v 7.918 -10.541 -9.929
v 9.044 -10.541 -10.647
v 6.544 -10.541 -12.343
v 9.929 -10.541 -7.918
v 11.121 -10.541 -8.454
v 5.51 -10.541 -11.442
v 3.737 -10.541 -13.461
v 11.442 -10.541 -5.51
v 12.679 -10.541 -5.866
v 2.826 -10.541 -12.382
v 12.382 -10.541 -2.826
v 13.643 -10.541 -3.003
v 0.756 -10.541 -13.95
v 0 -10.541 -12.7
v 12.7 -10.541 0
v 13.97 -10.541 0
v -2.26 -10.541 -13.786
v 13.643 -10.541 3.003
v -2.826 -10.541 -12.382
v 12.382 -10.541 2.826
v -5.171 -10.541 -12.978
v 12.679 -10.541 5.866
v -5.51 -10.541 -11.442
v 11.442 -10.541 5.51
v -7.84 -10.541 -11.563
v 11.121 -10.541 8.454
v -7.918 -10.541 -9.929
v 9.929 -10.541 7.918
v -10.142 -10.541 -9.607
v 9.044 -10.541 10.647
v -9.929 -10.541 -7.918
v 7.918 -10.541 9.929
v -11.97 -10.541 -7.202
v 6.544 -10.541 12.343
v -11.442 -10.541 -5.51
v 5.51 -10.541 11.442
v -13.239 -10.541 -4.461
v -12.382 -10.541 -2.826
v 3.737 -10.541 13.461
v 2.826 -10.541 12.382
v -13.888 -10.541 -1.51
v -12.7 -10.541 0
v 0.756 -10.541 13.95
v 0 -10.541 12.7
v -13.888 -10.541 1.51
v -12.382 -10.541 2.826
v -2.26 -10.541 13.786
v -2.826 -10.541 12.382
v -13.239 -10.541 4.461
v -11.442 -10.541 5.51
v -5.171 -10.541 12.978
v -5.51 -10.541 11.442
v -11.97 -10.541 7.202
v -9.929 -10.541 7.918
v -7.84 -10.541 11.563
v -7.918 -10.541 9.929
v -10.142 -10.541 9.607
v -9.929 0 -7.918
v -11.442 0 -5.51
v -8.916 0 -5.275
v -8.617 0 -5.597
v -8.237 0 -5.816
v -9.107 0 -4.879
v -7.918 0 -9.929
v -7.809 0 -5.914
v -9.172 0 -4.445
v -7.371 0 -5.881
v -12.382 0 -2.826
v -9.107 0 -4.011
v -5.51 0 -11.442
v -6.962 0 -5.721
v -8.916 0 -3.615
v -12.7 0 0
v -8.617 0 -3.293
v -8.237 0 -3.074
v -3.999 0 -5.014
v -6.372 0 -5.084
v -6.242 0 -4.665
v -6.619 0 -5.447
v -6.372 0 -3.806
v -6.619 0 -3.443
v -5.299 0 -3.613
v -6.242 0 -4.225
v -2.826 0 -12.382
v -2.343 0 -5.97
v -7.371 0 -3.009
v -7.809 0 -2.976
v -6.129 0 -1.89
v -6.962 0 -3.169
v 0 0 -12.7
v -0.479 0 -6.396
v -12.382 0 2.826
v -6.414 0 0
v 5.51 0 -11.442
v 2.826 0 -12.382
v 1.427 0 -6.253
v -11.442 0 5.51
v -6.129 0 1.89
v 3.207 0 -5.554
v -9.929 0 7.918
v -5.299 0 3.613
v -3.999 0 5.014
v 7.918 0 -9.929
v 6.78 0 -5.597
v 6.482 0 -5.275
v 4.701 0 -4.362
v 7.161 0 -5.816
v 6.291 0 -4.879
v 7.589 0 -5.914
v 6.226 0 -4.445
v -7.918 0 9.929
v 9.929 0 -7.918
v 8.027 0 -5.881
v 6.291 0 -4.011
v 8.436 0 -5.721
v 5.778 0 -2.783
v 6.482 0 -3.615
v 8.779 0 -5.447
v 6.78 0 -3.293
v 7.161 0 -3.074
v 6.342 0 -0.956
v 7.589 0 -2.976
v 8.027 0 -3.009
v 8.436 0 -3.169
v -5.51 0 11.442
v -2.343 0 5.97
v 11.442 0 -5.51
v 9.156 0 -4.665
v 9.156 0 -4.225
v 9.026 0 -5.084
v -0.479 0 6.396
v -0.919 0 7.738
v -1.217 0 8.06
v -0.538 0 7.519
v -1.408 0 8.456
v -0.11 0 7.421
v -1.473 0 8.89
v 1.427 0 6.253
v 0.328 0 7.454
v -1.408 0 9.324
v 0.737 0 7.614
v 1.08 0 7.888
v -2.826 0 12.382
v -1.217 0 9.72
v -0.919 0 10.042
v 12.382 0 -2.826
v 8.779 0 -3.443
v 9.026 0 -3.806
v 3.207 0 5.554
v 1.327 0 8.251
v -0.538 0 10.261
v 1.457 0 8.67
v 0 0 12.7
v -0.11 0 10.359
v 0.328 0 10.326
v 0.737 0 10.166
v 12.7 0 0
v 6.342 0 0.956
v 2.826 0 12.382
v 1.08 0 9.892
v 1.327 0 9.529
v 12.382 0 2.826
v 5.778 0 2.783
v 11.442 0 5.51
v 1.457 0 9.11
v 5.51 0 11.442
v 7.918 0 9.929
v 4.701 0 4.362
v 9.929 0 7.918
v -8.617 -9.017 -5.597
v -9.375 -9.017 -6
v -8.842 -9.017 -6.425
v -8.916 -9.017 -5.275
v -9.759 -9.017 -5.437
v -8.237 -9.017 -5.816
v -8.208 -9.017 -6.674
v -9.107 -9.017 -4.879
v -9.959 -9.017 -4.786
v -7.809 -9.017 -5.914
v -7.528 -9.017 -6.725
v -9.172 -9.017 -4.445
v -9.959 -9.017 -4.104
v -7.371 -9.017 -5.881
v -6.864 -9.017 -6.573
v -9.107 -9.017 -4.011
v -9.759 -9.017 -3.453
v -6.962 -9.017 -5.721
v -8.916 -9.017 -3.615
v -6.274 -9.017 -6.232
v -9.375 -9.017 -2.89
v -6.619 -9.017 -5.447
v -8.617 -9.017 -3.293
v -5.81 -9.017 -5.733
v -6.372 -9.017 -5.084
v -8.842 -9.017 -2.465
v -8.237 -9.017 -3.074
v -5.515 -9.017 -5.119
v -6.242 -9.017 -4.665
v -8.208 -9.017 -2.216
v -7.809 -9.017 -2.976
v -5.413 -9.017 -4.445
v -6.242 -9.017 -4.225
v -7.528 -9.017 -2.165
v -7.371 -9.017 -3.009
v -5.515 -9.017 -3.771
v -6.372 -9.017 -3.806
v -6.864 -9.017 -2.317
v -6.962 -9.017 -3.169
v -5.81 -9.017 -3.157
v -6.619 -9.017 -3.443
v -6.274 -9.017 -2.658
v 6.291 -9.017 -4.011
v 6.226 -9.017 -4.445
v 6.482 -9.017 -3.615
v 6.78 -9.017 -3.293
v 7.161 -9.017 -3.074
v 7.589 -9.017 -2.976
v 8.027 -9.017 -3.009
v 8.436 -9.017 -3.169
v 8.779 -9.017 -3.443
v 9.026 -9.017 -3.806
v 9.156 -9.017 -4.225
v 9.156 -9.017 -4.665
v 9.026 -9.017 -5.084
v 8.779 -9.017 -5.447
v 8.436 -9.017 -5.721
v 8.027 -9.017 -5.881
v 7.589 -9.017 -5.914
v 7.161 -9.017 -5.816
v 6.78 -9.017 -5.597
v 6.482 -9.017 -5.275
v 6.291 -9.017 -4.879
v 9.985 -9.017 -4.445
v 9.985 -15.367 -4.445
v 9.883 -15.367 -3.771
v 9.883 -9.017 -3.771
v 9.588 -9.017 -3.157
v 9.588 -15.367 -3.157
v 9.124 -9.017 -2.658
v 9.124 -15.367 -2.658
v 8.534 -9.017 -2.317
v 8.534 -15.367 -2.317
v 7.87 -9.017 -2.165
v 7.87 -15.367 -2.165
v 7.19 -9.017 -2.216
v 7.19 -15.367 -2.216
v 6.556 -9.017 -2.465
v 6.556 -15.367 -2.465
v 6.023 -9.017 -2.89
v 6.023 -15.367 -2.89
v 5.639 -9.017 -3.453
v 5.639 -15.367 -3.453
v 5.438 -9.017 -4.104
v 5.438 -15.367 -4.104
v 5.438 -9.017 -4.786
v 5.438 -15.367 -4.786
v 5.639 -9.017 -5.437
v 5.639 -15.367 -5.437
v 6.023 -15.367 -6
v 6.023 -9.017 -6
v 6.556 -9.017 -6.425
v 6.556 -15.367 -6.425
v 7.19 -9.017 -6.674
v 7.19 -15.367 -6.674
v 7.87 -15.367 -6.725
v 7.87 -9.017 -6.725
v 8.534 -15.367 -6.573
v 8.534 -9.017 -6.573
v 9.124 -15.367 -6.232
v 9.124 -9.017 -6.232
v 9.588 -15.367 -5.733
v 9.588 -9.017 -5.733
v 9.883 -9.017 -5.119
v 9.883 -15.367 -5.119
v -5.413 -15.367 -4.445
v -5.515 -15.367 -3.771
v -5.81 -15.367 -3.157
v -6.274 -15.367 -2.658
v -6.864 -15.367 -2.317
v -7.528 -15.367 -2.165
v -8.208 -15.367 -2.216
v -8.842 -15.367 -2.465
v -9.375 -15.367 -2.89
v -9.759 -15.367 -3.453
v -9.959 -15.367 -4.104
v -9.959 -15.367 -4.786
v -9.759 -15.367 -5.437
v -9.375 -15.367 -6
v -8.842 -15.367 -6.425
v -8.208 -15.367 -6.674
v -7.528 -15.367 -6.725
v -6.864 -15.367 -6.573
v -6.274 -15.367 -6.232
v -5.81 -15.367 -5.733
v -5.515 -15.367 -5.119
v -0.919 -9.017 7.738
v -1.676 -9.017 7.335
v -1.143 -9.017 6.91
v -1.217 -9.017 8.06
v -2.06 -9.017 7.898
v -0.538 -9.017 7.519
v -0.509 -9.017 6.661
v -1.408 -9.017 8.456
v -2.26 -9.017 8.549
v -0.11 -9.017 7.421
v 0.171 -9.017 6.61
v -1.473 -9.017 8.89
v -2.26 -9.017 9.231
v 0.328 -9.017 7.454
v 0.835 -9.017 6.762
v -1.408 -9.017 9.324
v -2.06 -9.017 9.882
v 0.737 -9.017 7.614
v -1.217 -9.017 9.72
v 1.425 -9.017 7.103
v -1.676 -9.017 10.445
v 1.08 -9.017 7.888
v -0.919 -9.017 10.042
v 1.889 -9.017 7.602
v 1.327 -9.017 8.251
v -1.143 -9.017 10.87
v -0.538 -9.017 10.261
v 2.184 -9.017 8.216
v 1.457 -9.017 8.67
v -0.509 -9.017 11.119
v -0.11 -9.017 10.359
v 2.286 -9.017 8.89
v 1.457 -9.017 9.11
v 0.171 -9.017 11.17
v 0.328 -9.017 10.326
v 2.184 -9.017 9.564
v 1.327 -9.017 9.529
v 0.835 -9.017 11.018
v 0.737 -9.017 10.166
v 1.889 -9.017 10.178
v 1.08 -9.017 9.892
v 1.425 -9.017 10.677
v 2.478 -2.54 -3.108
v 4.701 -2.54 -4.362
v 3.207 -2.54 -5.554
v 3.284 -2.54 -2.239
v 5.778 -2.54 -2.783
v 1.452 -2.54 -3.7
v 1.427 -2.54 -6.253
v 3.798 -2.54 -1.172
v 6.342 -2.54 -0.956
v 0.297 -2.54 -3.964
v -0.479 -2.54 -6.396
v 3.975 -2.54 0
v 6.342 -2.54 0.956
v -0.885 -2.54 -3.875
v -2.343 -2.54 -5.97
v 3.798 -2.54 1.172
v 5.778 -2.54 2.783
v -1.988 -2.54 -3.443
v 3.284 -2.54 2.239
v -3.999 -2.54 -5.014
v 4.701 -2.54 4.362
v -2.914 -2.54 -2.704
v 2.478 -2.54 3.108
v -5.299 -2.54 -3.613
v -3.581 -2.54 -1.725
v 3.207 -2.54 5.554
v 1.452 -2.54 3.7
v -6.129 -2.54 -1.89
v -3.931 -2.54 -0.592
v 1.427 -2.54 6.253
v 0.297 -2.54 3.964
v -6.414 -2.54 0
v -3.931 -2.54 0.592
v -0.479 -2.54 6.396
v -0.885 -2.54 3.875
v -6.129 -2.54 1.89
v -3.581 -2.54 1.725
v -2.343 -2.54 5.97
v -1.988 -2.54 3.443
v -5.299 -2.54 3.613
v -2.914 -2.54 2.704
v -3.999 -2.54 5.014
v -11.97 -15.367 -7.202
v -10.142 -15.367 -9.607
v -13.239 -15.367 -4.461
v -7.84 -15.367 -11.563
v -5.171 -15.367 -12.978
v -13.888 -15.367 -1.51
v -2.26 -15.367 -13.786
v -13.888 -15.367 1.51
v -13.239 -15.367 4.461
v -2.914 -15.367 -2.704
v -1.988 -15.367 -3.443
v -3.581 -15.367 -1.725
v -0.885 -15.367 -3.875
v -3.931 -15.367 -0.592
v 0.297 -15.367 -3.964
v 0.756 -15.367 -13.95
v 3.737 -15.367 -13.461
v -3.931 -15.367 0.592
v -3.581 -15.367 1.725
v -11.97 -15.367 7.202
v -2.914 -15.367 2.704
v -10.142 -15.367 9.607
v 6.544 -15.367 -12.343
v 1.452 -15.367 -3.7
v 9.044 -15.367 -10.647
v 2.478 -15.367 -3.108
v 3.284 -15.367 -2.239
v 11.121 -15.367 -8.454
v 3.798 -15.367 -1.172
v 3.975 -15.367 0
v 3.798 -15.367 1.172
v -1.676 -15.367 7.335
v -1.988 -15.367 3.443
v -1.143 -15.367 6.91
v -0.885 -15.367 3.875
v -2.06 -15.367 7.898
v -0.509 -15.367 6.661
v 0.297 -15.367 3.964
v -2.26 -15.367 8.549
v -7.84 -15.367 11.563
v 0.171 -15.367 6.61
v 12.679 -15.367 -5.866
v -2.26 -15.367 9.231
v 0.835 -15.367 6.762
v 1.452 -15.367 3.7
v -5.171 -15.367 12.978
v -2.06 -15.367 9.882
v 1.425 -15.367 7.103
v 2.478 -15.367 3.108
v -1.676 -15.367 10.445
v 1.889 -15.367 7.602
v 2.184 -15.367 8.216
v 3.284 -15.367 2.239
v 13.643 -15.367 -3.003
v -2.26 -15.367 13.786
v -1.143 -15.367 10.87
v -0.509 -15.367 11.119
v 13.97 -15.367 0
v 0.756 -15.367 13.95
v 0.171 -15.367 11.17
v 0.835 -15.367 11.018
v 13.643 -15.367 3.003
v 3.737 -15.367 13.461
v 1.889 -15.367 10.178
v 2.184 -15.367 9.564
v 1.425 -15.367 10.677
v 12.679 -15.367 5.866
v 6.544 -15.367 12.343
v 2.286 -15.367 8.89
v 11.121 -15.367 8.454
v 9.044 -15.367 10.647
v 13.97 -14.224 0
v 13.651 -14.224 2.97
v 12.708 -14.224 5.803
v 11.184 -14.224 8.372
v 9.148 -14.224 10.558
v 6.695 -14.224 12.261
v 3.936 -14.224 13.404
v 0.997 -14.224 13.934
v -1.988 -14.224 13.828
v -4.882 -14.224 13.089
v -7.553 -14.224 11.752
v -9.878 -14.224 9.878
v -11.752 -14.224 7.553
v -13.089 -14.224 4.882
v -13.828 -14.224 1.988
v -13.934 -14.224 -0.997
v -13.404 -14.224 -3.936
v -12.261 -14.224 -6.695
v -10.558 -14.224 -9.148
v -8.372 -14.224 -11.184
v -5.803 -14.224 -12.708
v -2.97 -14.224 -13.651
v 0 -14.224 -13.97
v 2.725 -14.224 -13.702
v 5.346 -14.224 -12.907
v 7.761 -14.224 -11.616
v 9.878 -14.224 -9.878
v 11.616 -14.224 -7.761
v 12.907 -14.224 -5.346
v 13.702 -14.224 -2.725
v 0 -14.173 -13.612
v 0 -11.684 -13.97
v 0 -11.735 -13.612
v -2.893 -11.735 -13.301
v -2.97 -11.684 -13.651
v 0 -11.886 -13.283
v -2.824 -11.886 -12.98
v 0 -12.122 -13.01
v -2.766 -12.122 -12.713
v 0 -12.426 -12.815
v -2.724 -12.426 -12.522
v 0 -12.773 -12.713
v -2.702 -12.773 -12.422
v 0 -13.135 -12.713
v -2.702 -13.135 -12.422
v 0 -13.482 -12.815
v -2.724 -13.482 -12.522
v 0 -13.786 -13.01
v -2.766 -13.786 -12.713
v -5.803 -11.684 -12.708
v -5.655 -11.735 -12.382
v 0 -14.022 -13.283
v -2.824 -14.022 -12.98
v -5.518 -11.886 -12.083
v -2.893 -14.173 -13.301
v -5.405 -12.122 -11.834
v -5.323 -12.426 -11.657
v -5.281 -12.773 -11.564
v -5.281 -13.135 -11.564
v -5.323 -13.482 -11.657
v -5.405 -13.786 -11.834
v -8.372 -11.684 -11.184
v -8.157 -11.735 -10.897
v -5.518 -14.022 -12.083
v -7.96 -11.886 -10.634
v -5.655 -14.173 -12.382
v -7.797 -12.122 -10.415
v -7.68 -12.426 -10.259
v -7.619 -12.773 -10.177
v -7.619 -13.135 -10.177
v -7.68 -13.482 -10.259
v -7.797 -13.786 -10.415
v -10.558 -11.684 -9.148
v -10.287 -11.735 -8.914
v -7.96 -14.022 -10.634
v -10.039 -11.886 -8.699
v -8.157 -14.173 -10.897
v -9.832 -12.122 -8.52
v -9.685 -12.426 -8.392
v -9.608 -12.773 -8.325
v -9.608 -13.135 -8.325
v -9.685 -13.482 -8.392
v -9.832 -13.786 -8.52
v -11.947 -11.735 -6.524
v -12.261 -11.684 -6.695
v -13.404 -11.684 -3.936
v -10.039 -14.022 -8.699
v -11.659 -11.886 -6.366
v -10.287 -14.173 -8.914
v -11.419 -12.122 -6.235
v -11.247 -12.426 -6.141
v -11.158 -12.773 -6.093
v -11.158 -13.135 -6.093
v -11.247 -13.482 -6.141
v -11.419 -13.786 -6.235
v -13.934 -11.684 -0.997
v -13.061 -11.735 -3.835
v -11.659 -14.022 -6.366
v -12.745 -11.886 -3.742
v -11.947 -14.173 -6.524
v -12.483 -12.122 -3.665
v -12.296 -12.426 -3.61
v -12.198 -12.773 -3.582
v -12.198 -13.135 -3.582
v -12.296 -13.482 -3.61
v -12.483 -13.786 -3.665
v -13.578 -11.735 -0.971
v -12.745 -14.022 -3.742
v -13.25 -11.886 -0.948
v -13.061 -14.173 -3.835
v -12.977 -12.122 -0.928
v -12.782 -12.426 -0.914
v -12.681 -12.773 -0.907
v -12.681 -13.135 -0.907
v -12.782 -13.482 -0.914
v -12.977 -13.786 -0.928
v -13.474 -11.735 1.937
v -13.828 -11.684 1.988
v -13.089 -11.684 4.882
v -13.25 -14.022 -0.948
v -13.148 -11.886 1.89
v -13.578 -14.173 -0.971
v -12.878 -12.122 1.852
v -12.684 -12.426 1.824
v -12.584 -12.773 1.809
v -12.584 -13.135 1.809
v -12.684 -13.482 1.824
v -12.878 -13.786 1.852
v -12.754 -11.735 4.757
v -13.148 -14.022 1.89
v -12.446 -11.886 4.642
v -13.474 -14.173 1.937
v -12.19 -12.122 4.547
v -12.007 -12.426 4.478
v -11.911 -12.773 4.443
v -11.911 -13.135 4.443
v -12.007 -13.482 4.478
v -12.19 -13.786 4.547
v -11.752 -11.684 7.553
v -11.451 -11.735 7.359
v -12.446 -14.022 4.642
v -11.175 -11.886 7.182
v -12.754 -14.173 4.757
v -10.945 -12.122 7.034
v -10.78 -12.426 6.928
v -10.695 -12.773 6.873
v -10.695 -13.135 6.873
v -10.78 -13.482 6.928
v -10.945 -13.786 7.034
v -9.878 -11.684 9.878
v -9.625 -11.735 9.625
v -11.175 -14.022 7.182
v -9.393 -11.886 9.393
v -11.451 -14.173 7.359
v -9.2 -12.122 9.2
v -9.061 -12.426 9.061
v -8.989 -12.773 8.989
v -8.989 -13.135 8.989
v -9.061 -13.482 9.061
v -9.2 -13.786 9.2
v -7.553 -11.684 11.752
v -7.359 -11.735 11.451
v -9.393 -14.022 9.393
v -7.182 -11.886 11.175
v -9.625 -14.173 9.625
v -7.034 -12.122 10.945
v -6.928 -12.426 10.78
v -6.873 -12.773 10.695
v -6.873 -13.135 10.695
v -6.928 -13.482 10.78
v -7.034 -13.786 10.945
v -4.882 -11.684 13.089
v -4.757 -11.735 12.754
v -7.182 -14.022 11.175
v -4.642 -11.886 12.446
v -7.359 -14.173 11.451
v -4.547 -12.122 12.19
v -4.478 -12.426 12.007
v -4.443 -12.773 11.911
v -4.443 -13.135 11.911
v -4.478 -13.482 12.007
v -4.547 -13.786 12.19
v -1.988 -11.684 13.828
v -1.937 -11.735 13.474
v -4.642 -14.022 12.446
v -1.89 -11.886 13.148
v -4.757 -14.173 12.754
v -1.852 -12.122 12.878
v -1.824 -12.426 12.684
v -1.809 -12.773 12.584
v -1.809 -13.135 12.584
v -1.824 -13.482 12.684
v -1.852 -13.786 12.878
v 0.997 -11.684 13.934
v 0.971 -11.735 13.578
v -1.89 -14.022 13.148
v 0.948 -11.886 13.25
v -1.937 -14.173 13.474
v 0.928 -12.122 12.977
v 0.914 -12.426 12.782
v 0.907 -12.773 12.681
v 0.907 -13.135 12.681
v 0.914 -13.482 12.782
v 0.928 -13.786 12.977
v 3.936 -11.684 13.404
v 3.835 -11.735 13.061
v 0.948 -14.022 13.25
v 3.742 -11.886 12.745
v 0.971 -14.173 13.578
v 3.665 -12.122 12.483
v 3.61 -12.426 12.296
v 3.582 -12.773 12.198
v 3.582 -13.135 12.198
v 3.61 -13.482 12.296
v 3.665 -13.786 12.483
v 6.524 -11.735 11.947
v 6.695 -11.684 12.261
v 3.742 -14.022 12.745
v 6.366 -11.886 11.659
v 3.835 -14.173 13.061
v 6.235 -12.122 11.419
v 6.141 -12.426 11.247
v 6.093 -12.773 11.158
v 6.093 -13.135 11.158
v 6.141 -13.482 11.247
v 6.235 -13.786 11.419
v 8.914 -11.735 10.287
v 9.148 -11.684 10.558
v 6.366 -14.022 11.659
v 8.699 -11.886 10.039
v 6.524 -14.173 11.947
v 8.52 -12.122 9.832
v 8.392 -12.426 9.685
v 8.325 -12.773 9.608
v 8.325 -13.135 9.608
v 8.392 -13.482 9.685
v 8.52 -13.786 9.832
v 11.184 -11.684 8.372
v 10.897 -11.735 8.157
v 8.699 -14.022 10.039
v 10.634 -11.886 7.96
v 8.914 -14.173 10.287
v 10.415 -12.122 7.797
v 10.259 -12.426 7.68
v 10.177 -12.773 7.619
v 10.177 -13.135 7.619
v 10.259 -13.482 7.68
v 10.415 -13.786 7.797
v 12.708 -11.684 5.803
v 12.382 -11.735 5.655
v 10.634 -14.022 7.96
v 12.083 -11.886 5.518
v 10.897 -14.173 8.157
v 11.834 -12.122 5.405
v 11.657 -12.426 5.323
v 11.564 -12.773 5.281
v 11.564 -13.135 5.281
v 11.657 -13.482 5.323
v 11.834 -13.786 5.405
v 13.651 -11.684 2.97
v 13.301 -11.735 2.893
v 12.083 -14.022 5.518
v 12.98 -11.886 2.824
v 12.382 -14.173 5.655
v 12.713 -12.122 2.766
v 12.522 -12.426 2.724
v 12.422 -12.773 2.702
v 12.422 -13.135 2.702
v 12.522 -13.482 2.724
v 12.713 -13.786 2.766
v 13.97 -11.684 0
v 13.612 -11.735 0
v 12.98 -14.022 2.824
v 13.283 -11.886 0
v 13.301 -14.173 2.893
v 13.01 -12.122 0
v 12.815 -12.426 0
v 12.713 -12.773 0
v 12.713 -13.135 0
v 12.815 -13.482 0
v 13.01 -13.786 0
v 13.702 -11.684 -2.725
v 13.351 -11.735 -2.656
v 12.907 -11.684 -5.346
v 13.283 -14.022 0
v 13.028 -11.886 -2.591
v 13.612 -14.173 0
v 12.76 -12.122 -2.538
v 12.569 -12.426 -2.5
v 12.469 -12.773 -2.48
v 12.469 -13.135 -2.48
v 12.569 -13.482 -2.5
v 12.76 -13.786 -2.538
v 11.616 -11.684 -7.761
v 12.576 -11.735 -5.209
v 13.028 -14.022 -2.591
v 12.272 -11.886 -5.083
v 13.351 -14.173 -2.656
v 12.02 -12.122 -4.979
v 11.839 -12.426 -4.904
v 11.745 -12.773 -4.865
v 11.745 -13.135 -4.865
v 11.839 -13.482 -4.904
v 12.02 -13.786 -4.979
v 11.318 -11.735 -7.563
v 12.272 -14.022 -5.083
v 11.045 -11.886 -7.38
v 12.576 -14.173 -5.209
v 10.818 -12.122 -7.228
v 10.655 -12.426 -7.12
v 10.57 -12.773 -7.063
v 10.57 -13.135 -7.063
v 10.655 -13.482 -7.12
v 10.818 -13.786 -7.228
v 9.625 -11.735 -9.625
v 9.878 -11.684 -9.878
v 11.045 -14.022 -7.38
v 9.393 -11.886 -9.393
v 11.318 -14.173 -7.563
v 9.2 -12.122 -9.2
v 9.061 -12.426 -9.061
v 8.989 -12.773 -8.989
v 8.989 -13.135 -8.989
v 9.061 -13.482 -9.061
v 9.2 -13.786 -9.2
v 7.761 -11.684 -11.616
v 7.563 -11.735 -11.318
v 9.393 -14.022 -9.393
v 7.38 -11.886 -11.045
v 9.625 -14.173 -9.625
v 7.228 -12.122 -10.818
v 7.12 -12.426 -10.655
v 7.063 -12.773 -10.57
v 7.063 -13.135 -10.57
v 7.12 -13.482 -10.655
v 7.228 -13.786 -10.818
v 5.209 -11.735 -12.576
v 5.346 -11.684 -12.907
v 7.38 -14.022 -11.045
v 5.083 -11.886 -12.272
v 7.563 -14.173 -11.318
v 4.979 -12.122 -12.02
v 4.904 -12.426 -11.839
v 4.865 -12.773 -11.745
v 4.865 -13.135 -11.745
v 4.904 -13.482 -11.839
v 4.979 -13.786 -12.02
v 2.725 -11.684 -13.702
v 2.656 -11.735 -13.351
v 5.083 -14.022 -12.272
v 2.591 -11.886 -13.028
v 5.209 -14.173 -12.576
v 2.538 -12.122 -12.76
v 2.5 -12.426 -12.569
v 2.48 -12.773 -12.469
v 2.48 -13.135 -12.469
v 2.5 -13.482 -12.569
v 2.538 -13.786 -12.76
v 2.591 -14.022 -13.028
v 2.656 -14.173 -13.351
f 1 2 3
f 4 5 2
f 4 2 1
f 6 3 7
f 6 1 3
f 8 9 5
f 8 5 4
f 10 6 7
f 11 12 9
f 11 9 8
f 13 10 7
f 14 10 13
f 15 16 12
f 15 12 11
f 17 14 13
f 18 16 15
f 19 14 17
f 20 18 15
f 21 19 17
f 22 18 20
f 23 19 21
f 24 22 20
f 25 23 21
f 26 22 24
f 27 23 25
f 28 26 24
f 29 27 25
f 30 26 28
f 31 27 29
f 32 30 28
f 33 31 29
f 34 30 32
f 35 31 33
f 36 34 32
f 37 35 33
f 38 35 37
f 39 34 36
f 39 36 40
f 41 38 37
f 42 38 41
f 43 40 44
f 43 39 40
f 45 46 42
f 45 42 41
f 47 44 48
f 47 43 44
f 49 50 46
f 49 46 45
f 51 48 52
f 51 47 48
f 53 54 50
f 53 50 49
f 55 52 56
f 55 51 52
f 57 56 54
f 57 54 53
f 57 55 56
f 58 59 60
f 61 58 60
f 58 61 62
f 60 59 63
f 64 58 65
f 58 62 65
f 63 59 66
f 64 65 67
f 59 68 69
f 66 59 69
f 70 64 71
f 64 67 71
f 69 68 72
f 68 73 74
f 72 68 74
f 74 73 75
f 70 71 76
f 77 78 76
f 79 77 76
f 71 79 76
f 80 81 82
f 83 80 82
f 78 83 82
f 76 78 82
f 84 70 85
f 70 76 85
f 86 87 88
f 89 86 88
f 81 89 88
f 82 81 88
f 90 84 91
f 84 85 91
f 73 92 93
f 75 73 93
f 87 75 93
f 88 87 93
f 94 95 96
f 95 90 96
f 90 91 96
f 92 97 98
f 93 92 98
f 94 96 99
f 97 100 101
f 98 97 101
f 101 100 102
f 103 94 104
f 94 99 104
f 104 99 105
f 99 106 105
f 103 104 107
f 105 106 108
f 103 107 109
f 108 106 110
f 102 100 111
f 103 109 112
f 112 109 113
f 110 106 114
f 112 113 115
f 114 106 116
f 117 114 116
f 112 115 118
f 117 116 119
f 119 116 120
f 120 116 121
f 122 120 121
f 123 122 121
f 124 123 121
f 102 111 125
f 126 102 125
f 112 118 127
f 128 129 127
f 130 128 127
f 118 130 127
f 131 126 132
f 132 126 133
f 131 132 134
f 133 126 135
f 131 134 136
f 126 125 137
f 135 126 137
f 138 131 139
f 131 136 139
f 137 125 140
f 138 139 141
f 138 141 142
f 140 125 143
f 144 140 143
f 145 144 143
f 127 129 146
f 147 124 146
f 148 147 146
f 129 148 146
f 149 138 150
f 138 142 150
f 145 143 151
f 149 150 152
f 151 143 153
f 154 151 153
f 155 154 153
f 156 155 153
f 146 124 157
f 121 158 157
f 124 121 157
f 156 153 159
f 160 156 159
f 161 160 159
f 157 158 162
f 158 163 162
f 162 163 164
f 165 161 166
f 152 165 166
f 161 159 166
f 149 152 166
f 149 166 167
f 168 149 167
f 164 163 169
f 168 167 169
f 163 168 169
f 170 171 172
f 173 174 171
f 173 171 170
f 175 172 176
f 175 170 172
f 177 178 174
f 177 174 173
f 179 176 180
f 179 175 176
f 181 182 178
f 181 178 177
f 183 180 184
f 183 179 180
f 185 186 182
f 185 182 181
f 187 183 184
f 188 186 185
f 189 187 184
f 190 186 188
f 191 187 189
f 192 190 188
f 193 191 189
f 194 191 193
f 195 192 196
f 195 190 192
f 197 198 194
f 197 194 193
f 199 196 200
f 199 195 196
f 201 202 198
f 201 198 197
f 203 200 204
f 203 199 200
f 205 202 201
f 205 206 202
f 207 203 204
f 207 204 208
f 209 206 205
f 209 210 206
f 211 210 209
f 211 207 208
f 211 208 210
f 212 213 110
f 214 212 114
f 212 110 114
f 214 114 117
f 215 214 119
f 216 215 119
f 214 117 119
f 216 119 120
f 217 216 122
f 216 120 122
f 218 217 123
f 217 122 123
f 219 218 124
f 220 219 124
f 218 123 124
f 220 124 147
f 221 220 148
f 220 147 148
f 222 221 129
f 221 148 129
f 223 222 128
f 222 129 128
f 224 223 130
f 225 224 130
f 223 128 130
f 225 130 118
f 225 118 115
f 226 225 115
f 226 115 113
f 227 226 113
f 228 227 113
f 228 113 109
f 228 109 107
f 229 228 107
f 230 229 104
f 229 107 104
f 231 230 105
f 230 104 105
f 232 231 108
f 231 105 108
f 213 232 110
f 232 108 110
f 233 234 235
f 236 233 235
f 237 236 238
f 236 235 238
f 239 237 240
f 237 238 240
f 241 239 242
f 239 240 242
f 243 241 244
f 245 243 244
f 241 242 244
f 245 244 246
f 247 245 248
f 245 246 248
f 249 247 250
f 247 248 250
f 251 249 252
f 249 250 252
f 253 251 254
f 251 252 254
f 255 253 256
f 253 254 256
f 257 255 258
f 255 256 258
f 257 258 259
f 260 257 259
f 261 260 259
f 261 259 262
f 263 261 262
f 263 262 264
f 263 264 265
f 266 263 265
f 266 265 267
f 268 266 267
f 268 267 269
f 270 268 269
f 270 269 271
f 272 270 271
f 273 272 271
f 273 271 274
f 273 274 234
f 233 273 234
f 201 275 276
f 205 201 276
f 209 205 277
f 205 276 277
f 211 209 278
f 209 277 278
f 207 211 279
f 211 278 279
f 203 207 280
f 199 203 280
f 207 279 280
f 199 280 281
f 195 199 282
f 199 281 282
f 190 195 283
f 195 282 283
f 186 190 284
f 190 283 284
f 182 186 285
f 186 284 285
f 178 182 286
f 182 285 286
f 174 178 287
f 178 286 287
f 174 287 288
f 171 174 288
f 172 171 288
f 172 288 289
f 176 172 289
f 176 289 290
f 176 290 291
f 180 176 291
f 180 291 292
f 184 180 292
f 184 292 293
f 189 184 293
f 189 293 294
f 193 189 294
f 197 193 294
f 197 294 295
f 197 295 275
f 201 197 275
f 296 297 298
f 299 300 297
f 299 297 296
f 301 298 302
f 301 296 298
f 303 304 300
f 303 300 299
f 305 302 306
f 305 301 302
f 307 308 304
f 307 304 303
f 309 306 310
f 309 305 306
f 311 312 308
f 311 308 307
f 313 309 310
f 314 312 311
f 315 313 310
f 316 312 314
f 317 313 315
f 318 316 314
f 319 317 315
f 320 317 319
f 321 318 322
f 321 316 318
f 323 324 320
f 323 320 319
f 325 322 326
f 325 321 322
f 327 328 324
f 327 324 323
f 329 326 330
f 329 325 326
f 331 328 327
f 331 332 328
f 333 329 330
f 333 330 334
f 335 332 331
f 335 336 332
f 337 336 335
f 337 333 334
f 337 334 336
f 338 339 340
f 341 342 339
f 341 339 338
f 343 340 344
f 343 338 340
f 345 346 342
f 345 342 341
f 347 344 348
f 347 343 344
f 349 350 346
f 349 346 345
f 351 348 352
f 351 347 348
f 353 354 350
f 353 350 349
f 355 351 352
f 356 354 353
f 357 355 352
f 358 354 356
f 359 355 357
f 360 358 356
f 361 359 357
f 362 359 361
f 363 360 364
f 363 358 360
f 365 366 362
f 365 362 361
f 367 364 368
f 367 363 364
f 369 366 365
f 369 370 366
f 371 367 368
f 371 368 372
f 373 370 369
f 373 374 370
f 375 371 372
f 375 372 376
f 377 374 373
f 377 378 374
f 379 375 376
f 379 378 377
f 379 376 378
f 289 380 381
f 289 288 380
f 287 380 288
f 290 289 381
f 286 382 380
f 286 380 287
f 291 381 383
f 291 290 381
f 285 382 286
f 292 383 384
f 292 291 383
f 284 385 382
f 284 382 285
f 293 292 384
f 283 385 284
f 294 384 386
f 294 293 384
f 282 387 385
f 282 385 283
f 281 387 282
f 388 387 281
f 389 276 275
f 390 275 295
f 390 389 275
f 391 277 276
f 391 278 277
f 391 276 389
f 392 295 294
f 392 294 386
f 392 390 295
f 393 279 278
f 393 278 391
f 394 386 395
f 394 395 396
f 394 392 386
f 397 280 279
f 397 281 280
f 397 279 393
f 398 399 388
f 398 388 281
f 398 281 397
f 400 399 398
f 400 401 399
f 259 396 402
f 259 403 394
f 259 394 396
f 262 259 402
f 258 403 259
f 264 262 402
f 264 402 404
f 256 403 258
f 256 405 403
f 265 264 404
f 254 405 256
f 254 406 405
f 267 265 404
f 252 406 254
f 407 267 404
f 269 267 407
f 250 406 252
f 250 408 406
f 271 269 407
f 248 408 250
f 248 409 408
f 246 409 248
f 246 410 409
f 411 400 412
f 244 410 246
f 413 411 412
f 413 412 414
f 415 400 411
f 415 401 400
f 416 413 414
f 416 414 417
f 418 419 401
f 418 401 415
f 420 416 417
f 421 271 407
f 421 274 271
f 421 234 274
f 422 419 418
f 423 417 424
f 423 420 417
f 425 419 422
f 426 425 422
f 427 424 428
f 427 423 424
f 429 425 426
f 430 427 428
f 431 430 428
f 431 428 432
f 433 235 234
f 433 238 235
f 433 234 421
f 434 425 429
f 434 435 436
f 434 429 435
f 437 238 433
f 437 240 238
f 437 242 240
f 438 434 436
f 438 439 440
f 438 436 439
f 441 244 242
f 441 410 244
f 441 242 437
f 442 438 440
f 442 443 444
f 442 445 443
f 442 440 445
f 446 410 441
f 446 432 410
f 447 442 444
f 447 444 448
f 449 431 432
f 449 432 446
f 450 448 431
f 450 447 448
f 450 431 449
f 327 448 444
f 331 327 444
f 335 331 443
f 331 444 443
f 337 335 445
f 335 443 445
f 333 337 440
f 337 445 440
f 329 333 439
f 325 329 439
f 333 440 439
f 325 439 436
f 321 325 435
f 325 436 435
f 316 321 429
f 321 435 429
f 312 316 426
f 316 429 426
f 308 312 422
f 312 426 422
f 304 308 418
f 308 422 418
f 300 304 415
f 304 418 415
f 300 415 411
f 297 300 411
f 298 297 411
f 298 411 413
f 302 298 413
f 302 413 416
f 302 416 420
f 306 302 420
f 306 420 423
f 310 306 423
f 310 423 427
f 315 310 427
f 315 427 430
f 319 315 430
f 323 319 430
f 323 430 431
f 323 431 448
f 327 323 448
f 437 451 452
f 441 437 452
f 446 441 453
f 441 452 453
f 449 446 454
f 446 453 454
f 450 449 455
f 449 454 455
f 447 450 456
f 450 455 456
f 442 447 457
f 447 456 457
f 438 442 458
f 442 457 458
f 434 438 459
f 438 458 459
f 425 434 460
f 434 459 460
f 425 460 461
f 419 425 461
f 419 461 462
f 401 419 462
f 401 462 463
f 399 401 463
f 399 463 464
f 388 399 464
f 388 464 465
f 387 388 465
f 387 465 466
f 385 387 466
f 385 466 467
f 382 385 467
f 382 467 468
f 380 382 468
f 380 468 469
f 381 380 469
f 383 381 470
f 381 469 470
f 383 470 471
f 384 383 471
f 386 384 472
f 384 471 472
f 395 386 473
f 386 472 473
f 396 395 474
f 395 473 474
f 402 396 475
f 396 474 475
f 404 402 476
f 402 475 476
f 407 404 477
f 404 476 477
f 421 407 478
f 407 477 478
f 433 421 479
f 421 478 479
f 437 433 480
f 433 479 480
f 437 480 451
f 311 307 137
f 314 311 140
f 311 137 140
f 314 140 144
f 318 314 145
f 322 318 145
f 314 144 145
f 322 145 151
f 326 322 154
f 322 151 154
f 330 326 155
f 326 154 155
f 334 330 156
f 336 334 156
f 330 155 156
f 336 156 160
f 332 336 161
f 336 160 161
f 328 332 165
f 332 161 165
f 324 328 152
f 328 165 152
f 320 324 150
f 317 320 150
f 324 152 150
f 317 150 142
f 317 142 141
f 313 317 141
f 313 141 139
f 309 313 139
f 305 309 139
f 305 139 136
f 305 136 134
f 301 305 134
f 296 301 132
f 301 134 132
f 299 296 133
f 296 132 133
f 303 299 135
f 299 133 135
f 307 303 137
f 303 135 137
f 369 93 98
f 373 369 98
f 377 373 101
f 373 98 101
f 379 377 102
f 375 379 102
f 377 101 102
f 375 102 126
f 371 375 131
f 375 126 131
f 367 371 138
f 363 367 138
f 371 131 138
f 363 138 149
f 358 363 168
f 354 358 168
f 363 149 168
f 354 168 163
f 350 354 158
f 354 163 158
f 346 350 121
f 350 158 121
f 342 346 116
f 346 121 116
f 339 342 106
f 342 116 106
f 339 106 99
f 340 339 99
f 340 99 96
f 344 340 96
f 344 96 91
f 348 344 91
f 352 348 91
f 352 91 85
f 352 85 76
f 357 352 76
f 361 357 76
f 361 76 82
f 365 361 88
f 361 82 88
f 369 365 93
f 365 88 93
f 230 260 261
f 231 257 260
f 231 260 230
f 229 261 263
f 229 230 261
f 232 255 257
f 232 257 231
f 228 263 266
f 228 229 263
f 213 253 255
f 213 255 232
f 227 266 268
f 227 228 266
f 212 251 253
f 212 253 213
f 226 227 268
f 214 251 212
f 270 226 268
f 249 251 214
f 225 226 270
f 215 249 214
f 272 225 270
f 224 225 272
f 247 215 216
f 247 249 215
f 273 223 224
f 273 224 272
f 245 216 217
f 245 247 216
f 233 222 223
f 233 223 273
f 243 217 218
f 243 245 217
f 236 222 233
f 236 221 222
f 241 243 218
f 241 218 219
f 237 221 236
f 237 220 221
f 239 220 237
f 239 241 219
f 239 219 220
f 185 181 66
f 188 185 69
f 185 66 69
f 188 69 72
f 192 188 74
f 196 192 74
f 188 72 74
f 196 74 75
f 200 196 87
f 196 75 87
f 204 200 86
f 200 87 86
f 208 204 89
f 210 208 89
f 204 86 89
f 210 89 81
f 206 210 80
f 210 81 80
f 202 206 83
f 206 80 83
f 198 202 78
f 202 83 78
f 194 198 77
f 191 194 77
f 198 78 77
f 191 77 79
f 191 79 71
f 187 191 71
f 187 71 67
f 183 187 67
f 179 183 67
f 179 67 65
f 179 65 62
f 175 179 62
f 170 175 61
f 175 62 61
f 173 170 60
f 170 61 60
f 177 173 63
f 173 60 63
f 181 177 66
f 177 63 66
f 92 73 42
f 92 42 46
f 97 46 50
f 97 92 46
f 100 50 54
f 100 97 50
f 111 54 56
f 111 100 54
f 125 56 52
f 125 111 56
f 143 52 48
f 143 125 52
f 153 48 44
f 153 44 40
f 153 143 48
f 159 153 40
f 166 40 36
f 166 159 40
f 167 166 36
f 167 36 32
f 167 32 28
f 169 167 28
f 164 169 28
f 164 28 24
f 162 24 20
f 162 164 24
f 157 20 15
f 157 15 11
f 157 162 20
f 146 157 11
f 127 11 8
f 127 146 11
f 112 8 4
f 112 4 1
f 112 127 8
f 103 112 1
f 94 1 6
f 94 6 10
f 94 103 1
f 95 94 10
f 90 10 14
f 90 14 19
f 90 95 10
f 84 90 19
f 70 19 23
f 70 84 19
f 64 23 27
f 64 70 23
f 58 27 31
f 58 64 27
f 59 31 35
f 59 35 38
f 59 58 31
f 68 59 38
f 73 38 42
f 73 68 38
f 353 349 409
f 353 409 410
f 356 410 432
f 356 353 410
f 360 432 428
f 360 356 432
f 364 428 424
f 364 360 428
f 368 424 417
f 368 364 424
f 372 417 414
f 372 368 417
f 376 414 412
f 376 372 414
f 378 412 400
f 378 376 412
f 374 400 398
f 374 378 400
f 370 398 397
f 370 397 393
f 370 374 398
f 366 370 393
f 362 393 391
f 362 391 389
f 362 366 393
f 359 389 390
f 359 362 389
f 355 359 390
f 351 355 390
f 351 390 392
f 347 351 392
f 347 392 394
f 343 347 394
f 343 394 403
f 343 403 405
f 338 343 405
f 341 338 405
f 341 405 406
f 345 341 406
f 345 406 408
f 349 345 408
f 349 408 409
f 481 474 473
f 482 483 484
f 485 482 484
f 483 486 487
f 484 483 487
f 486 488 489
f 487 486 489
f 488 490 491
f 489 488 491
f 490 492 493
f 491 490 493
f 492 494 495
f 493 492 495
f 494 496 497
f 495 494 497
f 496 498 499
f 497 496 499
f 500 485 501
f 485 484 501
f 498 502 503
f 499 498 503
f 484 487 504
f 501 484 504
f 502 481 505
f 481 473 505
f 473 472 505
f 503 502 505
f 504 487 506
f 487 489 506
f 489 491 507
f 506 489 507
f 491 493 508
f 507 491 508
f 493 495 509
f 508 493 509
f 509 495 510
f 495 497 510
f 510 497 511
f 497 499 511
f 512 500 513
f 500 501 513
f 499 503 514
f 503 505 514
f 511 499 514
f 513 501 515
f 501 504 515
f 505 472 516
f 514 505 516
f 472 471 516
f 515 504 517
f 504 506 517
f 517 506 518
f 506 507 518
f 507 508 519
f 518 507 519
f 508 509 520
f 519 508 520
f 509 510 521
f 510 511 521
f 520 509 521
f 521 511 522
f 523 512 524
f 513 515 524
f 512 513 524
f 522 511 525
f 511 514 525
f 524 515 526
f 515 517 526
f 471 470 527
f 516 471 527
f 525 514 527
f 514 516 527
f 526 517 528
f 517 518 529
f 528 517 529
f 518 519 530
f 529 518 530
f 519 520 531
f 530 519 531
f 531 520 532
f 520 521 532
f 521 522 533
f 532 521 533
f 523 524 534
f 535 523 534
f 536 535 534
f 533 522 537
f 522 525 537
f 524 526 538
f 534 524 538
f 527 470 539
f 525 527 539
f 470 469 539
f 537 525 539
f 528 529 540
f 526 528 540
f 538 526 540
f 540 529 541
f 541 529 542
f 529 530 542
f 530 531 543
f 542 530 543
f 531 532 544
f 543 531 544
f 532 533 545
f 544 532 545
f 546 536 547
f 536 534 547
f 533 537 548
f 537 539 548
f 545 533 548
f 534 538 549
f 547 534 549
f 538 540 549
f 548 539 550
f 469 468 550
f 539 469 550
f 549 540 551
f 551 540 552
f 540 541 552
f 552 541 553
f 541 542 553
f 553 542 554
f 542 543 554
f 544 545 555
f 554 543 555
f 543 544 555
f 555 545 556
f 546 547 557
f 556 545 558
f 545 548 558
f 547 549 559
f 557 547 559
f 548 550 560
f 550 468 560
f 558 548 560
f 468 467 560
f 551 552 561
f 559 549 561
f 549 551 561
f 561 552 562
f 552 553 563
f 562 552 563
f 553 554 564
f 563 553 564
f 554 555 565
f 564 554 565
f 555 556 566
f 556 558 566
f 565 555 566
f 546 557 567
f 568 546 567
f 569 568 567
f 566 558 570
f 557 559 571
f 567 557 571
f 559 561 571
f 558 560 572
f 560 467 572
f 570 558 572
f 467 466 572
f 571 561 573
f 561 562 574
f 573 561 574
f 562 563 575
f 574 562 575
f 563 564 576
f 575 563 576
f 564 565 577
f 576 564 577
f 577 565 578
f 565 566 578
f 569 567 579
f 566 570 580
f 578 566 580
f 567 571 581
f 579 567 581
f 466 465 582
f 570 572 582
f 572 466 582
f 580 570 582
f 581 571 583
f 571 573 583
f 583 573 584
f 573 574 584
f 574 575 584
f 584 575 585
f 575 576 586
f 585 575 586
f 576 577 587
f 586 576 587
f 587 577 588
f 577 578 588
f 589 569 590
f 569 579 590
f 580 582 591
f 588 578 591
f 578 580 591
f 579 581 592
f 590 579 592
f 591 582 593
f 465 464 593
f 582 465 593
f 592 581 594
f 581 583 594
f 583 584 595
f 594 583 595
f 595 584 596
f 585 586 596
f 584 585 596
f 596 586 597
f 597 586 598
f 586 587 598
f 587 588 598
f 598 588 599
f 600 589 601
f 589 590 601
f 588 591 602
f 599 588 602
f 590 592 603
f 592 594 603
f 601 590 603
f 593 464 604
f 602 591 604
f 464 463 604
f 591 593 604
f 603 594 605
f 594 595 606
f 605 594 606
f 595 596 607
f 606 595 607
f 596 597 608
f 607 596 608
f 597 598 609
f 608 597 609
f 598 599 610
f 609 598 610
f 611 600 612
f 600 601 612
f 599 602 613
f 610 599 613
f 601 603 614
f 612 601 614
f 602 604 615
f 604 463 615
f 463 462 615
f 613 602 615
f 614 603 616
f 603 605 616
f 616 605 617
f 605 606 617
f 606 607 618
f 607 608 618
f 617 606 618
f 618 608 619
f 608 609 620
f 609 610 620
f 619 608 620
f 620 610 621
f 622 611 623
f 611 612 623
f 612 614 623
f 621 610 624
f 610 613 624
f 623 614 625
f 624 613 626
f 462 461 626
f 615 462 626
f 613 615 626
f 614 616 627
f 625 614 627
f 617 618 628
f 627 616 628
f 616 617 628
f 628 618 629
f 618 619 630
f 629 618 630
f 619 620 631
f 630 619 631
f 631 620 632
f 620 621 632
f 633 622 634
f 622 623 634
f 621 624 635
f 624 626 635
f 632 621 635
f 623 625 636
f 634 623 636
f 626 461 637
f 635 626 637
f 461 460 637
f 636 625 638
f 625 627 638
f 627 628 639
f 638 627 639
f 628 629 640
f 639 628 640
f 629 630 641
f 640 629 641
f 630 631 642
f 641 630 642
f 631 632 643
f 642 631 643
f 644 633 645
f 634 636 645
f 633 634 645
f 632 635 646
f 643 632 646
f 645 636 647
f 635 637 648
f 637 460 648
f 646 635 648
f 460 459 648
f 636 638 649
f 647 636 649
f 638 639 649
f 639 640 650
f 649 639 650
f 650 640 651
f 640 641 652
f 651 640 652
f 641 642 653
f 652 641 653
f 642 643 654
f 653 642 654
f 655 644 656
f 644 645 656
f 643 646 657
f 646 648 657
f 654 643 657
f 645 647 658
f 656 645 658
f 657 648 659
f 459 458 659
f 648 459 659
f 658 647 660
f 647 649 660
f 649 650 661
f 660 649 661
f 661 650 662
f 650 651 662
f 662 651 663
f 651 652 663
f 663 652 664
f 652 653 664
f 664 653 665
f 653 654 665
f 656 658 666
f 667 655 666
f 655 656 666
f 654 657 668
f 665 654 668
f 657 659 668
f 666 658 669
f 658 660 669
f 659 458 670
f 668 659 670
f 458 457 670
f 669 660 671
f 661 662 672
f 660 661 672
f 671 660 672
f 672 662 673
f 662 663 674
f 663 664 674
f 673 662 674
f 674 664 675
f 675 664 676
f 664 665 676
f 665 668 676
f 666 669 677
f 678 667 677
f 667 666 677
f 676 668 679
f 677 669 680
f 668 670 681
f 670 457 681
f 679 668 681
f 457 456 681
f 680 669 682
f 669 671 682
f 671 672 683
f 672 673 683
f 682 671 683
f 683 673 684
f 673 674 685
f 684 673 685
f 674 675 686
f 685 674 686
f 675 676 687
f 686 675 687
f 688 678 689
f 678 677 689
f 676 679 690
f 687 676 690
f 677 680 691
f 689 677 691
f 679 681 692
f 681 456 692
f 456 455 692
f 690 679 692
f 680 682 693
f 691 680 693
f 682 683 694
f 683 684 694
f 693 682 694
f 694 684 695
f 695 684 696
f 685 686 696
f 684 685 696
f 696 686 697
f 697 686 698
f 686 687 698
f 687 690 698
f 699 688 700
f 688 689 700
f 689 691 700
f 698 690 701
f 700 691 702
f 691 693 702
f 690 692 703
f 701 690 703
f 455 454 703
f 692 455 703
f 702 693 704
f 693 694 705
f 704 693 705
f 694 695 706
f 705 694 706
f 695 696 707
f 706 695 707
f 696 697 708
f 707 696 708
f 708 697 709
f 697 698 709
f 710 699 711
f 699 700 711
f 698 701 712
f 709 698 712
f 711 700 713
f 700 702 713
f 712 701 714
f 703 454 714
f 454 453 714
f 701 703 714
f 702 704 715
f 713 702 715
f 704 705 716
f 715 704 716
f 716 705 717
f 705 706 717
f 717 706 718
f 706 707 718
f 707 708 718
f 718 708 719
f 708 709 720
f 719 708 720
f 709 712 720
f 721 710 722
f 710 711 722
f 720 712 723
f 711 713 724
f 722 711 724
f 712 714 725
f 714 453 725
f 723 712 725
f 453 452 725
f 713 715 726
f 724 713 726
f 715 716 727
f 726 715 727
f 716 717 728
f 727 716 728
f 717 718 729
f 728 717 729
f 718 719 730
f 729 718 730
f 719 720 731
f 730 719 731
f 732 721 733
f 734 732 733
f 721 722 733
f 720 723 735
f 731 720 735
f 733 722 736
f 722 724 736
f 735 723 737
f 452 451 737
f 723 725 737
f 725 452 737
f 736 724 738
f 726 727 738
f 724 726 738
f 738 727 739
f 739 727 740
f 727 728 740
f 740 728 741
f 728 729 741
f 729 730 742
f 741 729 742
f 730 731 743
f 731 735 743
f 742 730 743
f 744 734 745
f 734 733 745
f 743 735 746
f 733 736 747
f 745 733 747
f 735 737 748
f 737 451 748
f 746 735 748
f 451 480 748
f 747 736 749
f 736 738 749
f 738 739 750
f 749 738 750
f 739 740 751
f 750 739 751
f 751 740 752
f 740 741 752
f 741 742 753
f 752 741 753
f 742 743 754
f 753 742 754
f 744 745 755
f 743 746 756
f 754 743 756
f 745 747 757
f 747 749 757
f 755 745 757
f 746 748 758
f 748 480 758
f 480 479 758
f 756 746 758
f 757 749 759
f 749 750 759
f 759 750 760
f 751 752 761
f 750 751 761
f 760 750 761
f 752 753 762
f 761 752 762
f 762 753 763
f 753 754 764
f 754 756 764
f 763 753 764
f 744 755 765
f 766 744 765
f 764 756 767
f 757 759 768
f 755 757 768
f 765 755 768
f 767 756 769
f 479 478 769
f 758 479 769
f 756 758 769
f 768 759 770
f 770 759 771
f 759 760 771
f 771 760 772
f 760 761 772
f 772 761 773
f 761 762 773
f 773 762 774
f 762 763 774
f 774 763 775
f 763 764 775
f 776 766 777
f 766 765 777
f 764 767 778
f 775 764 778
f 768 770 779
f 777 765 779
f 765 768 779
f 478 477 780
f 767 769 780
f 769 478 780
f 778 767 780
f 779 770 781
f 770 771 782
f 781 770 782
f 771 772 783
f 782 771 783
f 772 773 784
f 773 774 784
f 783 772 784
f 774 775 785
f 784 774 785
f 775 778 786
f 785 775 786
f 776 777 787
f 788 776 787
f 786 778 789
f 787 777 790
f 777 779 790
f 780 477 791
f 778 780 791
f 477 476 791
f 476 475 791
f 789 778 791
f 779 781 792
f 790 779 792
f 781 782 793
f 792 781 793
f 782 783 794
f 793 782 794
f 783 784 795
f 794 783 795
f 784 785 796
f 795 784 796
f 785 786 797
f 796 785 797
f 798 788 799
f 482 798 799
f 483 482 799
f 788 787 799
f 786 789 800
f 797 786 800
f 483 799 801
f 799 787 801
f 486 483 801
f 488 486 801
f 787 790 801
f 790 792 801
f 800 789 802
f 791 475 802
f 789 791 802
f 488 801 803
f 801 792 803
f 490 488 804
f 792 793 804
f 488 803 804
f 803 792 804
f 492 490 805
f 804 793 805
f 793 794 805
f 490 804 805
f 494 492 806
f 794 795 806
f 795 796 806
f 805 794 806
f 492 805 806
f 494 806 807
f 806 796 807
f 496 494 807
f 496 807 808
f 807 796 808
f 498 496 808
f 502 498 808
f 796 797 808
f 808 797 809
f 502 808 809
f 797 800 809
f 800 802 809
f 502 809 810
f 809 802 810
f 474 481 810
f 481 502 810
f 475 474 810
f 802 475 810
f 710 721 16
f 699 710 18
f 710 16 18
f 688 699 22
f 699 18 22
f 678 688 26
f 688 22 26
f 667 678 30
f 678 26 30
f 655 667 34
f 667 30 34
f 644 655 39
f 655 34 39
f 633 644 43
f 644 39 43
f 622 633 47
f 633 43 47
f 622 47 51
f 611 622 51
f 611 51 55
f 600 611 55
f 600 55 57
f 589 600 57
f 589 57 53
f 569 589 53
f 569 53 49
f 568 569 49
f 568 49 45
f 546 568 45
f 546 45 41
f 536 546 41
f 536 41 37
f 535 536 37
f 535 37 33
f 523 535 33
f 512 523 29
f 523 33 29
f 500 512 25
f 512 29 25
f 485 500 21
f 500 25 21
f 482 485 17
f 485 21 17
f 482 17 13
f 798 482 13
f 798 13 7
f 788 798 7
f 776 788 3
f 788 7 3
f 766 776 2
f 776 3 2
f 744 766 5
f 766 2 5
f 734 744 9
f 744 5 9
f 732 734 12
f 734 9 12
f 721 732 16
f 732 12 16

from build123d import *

# Parameters (mm, degrees)
F0_R           = 13.97
F0_R_2         = 3.9751
F1_DEPTH       = 15.367
F3_D           = 2.9464
F3_CBORE_D     = 4.572
F3_CBORE_DEPTH = 6.35
F4_R           = 6.4135
F4_R_2         = 3.9751
F5_DEPTH       = 2.54
F6_R           = 1.27
F8_R           = 13.97
F8_R_2         = 12.7
F9_DEPTH       = 10.541


with BuildPart() as f1:
    # F0 (on Front) → F1 (new body)
    with BuildSketch(Plane.XZ):
        Circle(F0_R)
        Circle(F0_R_2, mode=Mode.SUBTRACT)
    extrude(amount=F1_DEPTH)

    # F3 (through all)
    with Locations(Plane.XZ.offset(15.367)):
        with Locations((0, 8.89), (-7.6989658396, -4.445), (7.6989658396, -4.445)):
            CounterBoreHole(F3_D / 2, F3_CBORE_D / 2, F3_CBORE_DEPTH)

    # F4 (on face) → F5 (cut)
    with BuildSketch(Plane(origin=(0, 0, 0), x_dir=(-1, 0, 0), z_dir=(0, 1, 0))):
        Circle(F4_R)
        Circle(F4_R_2, mode=Mode.SUBTRACT)
    extrude(amount=-F5_DEPTH, mode=Mode.SUBTRACT)

    # F7: sweep along a path in F7_path
    with BuildLine(Plane(origin=(13.97, -15.367, 0), x_dir=(0, 0, -1), z_dir=(0, 1, 0))) as f7_path:
        CenterArc((0, 13.97), 13.97, 0, 360)
    # F6 (on Right) → F7 (sweep, cut)
    with BuildSketch(Plane.YZ):
        with Locations((-12.954, 13.97)):
            Circle(F6_R)
    sweep(path=f7_path.line, mode=Mode.SUBTRACT)

    # F8 (on face) → F9 (cut)
    with BuildSketch(Plane(origin=(0, 0, 0), x_dir=(-1, 0, 0), z_dir=(0, 1, 0))):
        Circle(F8_R)
        Circle(F8_R_2, mode=Mode.SUBTRACT)
    extrude(amount=-F9_DEPTH, mode=Mode.SUBTRACT)


solid = f1.part
